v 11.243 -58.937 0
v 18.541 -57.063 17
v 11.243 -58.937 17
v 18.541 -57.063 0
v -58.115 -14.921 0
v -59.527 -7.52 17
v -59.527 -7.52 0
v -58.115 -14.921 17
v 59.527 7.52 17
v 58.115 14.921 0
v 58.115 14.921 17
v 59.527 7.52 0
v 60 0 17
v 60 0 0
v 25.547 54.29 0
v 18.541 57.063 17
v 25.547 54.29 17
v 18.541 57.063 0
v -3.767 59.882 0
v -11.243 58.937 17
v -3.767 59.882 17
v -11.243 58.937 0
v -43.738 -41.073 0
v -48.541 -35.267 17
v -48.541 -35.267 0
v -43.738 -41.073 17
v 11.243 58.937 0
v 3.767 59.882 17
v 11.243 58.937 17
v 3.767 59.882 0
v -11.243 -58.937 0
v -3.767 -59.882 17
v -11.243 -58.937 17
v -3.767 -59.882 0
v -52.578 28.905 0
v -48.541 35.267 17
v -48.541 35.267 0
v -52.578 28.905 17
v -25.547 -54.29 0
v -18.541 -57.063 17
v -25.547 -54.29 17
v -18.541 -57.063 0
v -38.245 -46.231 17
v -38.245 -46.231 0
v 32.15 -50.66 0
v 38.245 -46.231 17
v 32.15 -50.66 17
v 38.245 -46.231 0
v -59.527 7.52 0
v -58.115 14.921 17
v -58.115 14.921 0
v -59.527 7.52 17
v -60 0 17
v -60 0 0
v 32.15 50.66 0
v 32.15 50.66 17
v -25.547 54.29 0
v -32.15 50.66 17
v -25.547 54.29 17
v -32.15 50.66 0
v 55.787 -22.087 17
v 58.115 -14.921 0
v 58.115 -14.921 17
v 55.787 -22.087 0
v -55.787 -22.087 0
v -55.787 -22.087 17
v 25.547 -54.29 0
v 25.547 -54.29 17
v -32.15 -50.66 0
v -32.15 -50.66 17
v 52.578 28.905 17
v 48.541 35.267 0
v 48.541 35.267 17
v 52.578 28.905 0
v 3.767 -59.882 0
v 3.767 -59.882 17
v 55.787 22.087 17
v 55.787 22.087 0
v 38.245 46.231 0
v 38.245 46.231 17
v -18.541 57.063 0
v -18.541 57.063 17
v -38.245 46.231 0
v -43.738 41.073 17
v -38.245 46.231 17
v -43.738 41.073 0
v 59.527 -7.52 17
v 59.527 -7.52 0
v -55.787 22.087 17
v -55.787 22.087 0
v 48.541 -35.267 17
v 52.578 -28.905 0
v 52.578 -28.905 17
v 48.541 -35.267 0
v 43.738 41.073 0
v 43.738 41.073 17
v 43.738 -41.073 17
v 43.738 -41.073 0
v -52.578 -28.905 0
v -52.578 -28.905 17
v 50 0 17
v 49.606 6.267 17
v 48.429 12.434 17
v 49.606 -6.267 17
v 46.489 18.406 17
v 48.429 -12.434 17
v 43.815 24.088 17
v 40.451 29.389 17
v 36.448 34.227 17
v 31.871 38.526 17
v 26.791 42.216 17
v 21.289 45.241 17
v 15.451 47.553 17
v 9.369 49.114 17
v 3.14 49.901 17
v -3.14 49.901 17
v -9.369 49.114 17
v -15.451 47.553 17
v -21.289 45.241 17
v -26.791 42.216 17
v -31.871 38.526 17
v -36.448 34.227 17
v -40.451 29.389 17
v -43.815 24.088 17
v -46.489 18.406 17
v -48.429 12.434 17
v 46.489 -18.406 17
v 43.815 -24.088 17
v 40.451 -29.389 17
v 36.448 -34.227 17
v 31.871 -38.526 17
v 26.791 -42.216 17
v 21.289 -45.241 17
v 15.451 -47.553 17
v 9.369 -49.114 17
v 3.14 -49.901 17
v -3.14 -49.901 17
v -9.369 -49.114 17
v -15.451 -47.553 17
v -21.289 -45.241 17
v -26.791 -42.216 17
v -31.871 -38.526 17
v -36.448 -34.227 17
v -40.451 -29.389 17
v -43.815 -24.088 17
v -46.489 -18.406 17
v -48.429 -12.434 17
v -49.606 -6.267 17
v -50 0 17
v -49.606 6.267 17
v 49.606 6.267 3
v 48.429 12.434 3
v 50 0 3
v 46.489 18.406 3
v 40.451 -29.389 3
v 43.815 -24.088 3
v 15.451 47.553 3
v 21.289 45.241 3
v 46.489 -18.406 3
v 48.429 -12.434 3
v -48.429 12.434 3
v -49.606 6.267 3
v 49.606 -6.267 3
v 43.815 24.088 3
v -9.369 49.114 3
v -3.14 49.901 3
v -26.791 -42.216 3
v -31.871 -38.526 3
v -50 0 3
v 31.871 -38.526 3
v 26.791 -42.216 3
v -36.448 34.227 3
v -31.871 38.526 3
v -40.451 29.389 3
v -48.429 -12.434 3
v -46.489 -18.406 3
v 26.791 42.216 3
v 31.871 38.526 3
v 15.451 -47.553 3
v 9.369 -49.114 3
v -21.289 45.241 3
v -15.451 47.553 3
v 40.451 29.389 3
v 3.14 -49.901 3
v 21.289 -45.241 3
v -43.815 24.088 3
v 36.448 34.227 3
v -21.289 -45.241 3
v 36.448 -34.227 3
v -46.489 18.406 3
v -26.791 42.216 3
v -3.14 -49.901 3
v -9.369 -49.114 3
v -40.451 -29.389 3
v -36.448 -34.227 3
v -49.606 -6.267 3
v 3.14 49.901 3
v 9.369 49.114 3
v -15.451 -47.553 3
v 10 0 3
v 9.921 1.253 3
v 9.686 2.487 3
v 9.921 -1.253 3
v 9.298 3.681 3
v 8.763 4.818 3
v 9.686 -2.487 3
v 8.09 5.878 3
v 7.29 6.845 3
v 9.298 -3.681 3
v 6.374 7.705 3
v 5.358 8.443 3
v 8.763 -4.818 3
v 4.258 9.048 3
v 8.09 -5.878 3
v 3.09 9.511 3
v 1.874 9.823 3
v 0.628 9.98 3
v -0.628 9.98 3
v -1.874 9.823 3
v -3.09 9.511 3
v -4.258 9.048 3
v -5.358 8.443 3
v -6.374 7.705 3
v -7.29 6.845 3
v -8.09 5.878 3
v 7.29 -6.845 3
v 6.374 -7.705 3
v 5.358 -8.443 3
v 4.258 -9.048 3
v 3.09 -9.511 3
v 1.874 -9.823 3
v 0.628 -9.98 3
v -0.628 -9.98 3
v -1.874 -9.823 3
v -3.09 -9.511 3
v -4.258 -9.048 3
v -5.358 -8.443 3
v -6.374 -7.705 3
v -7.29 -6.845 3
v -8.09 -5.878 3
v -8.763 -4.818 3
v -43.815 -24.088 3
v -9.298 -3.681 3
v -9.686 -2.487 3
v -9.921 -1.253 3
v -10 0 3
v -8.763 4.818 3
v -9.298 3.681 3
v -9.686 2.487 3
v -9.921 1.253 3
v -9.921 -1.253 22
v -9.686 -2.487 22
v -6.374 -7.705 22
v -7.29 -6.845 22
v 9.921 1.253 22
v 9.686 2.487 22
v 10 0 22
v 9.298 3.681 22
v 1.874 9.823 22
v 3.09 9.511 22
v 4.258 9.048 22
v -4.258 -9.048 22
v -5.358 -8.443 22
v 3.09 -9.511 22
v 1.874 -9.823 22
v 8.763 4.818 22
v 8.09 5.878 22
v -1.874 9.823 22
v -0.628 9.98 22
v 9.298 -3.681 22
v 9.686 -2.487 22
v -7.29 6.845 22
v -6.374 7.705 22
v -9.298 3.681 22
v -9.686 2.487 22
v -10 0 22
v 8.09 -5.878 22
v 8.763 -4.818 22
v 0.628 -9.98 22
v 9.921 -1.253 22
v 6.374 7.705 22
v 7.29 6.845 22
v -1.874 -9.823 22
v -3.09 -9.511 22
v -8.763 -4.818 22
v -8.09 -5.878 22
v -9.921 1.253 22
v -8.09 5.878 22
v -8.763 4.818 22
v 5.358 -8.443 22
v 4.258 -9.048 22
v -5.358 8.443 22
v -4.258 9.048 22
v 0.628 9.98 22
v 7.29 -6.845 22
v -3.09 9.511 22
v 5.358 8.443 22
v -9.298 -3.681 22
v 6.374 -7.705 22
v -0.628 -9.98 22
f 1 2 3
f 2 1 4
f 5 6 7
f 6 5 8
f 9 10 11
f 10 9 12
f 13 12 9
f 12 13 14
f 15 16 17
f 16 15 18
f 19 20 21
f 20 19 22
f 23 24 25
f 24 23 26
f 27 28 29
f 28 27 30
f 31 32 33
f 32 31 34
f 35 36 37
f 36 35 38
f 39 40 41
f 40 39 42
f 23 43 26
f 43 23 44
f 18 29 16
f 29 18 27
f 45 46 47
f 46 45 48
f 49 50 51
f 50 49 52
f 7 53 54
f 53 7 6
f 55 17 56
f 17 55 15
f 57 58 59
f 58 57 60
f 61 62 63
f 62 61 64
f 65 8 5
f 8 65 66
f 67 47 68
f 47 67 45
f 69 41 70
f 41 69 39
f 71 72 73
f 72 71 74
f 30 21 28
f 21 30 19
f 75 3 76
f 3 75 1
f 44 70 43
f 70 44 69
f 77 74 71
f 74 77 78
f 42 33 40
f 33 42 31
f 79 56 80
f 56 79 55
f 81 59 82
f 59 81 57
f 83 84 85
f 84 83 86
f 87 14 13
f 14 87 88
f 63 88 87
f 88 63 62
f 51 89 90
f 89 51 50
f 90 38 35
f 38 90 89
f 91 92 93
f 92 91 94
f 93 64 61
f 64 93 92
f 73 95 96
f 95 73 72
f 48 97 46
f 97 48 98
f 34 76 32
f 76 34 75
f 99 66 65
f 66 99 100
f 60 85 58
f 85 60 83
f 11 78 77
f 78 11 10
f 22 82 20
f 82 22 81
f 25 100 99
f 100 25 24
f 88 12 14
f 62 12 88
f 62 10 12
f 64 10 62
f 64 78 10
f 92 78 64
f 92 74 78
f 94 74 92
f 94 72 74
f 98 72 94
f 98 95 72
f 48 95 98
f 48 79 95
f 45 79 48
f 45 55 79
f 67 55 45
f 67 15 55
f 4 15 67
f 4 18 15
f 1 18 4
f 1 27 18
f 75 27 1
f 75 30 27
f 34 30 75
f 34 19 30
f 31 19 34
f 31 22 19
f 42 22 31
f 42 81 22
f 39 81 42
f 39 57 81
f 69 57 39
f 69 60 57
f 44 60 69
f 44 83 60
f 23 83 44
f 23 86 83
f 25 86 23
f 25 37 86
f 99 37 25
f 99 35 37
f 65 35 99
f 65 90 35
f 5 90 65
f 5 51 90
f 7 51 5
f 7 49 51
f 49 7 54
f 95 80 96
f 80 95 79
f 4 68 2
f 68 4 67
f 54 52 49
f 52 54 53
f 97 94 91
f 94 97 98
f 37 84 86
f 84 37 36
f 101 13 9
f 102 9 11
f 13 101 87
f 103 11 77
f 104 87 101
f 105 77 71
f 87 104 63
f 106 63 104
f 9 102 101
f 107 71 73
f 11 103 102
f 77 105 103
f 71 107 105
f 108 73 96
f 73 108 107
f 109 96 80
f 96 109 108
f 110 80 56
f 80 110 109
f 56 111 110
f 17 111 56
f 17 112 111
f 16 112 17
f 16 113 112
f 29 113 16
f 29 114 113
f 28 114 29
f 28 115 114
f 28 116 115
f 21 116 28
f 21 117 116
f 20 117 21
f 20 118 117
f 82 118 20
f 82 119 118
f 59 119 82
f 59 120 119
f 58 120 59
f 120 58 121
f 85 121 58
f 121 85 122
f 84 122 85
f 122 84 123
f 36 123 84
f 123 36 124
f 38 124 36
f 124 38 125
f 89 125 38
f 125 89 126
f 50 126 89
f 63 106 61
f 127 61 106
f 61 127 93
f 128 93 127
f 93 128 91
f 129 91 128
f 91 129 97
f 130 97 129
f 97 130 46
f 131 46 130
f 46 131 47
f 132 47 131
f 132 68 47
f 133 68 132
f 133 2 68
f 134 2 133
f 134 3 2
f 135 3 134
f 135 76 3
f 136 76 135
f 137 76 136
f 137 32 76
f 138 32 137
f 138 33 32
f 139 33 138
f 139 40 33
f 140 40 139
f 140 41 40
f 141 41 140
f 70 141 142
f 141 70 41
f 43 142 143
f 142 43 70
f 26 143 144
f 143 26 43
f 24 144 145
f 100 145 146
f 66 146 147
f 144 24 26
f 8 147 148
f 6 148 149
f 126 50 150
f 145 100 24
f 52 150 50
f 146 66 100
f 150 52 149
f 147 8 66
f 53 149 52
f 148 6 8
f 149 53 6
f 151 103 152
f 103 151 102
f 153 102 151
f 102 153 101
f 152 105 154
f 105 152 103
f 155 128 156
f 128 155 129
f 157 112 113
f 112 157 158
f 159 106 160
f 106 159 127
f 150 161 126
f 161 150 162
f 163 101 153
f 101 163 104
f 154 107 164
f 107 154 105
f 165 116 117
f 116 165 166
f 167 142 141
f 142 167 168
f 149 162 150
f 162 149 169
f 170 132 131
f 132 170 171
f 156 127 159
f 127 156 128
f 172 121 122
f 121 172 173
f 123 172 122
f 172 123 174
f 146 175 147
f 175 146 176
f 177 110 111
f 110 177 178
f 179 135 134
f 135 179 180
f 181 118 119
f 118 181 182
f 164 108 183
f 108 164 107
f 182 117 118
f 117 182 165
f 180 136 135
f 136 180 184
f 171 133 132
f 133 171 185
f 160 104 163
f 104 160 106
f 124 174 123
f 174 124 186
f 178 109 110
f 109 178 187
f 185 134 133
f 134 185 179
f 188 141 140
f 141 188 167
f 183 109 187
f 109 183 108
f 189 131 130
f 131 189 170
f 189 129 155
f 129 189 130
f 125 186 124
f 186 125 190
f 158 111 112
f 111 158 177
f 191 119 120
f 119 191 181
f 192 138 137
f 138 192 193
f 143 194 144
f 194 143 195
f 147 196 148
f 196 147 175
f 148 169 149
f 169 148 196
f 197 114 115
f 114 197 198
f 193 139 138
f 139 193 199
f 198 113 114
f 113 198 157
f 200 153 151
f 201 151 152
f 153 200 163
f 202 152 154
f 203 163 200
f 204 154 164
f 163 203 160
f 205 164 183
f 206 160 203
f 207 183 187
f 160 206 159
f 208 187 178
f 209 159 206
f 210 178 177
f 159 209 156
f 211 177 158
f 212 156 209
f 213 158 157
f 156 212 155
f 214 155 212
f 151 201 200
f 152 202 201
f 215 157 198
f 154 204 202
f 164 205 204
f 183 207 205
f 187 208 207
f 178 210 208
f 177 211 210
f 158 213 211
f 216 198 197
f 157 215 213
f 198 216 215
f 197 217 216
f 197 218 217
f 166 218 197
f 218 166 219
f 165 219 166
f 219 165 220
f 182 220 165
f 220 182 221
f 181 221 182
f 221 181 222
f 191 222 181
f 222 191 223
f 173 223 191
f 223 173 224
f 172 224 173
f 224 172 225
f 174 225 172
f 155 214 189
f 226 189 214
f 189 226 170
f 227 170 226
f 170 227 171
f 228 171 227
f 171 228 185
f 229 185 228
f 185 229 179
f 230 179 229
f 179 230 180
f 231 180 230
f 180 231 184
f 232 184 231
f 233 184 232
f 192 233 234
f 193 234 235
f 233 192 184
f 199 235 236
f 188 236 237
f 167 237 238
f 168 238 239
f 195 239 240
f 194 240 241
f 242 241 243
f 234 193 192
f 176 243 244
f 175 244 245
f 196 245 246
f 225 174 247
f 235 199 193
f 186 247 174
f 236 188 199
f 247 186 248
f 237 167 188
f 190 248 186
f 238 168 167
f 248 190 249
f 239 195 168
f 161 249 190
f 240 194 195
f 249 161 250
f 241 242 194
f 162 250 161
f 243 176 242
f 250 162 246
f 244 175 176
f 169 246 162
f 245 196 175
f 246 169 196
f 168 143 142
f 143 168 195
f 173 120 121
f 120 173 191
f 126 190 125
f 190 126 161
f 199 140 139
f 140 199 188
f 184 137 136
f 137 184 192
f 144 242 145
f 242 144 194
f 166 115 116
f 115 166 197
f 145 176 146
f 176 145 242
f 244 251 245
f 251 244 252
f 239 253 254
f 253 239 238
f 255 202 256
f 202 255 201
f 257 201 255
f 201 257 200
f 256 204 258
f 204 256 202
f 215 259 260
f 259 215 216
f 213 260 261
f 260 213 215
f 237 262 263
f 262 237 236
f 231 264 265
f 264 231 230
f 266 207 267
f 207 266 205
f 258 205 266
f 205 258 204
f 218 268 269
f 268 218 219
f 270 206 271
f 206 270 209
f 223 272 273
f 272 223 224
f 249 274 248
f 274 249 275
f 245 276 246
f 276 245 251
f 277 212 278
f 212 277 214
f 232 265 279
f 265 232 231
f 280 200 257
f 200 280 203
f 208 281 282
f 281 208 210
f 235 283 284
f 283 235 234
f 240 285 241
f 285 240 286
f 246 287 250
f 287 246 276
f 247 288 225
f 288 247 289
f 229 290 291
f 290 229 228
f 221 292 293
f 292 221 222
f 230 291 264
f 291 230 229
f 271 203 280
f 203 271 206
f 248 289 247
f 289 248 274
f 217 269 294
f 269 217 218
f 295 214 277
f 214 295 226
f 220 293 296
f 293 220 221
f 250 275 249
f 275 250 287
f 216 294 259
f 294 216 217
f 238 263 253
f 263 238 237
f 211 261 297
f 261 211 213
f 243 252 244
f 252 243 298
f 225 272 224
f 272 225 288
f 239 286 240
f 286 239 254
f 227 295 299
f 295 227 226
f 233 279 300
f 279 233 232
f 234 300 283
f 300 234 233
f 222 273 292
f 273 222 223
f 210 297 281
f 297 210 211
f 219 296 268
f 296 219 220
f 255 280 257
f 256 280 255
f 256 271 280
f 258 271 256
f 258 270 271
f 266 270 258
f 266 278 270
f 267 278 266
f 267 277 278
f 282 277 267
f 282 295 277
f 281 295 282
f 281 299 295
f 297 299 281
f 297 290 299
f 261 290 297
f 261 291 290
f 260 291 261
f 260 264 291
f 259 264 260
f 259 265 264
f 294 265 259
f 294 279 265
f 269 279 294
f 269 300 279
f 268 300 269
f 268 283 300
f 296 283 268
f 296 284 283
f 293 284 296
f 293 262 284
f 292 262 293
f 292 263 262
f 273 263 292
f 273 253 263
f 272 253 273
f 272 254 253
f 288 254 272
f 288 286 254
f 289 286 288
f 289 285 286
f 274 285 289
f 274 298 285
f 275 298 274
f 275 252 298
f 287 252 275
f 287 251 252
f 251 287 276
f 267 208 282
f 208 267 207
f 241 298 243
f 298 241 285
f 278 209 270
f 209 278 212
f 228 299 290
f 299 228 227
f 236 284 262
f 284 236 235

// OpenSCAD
include <fillets_and_rounds.scad>

// IIIIIIIIIIIIIIIIIIIII MISC IIIIIIIIIIIIIIIIIIIIIIIIIII
$fn = 50;

TOLERANCE=0;
SHELL_RES = 50;

// IIIIIIIIIIIIIIIIIIIII BASE IIIIIIIIIIIIIIIIIIIIIIIIIII
BASE_DIA = 120;
BASE_HEI = 25;

TOP_ROUND=0;
bOTTOM_ROUND=0;

// IIIIIIIIIIIIIIIIIIIII DIAL IIIIIIIIIIIIIIIIIIIIIIIIIII
DIAL_HEI = 20;
DIAL_OUT = 2;               //not automted at all
DIAL_INNER_DIA = 0;
DIAL_PEAK_DIST = 8;

DIAL_SHELL_THICK = 4;
DIAL_LIP_WIDTH = 2;
DIAL_LIP_THICK = 0;
DIAL_CUT_RES = SHELL_RES;

GRIP_TRACE_DEPTH=1.5;
GRIP_TRACE_NUDGE= .9;       // moves grip inwards or outwards from dial
GRIP_TRACE_OFFSET = 10;     // distance between traces in mm
GRIP_TRACE_RES = SHELL_RES;
// even trace rounds down to a even number when calculating steps
EVEN_GRIP_TRACE = true;


//__main__
    //Cyl_base(dia=BASE_DIA, hei=BASE_HEI, res=10);
    Cyl_bottom(R=0);

    // Dino(BASE_HEI);

//__main__ end

// ~~~~~~~~~~~~~~~~~~~~~~~~~~~ BASE ~~~~~~~~~~~~~~~~~~~~~~~~~~~
module Cyl_base(dia=120, dia = 120, hei = 25, res = 10, base_R=1, Top_R=1,
                wall_thick=10, top_thick=3, bottom_thick=3) {
    // top
    add_rounds(R=4, fn=res) {
        translate([0,0, hei/2]) cylinder(d=dia, h=hei/2);
        translate([0,0, hei])   cube([dia+1, dia+1, hei/2], center=true);
    }
    


}

module Cyl_bottom(dia=120, hei=17, 
                  bottom_thick=3, wall_thick=10, 
                  thread_h=22, thread_dia=20,
                  R=2.5, res=10) {

    difference() {                      
        // base
        union() {
            // outer cylinder
            difference() {
                add_rounds(R=R, fn=res) {
                    cylinder(d=dia, h=hei);
                    cube([dia+1, dia+1, hei/2], center=true);
                }
                //cylinder(d=dia,h=hei);

                //donut cut
                translate([0,0,bottom_thick])
                    cylinder(d=(dia-wall_thick*2), h=hei);            
            }

            cylinder(d=thread_dia, h=thread_h);
        }

        // dial cut
        union() {
            
        }
    }
}   

// --------------------------- BASE ---------------------------
    

// ~~~~~~~~~~~~~~~~~~~~~~~~~~~ DIAL ~~~~~~~~~~~~~~~~~~~~~~~~~~~
module Dial(height = DIAL_HEI, peak_dist = DIAL_PEAK_DIST, thickness = DIAL_OUT,
            shell_thick = DIAL_SHELL_THICK, lip_width = DIAL_LIP_WIDTH, lip_thick = DIAL_LIP_THICK,
            cut_res = DIAL_CUT_RES,
            trace_depth = GRIP_TRACE_DEPTH, trace_nudge = GRIP_TRACE_NUDGE, trace_offset = GRIP_TRACE_OFFSET,
            even_trace = EVEN_GRIP_TRACE, base_dia = BASE_DIA, grip_res = GRIP_TRACE_RES,
            tolerance = TOLERANCE, res = SHELL_RES) {

    circumfrance = PI * base_dia; // from outermost diameter
    
    difference(){
        //color("#8b5d2e")   
        
        Dial_base(0, base_dia + thickness, height - tolerance, peak_dist - (tolerance/2), res); 

            Dial_trace(circumfrance, trace_depth, trace_offset, (base_dia + thickness)/2 + trace_nudge, 
              grip_res);
        
        Dial_basecut(base_dia - shell_thick, height, lip_width, lip_thick);

    }
}

module Dial_base(dia_inner = 0, dia_outer, hei, peak_dist, res) {
    intersection() {   
        cylinder(d=dia_outer, h=hei, $fn=res);

        hull(){
            translate([0,0,peak_dist])
                sphere(d=dia_outer, $fn=res);
            translate([0,0,hei - peak_dist])
                sphere(d=dia_outer, $fn=res);

        }
    }
}

module Dial_basecut(dia, height, lip_width, lip_thick) {
    translate([0, 0, -.5])
        color("blue")
            cylinder(d=dia - lip_width, h=height + 1);
    translate([0, 0, -1])
        color("purple")
            cylinder(d=dia, h=height - lip_thick + 1.01);
}

module Gear_fill() {

}

module Dial_trace(circumfrance, trace_depth, trace_step, nudge,
             res, max_height = 30) {

    for (x = [0: trace_step: 360]) {
            rotate_about_pt(x, 0, [0,0,0])
                translate([nudge, 0, 0])
                    color("#654321") 
                        cylinder(d=trace_depth*2, h=max_height, $fn=res);
    }

}

// --------------------------- DIAL ------------------------------


module rotate_about_pt(z, y, pt) {
    translate(pt)
        rotate([0, y, z]) 
            translate(-pt)
                children();   
}

// ~~~~~~~~~~~~~~~~~~~~~~~~~~~ MISV ~~~~~~~~~~~~~~~~~~~~~~~~~~~

module Dino(y_off = 25) {
    color("#9fff30")
        translate([0,0,72 + y_off])
            rotate([90, 0, 0])
                linear_extrude(2.5) 
                    import("C:/Users/totte/Desktop/Deskito/projects/Dino-lamp/dinobox2/chonky_dino.svg");
}
